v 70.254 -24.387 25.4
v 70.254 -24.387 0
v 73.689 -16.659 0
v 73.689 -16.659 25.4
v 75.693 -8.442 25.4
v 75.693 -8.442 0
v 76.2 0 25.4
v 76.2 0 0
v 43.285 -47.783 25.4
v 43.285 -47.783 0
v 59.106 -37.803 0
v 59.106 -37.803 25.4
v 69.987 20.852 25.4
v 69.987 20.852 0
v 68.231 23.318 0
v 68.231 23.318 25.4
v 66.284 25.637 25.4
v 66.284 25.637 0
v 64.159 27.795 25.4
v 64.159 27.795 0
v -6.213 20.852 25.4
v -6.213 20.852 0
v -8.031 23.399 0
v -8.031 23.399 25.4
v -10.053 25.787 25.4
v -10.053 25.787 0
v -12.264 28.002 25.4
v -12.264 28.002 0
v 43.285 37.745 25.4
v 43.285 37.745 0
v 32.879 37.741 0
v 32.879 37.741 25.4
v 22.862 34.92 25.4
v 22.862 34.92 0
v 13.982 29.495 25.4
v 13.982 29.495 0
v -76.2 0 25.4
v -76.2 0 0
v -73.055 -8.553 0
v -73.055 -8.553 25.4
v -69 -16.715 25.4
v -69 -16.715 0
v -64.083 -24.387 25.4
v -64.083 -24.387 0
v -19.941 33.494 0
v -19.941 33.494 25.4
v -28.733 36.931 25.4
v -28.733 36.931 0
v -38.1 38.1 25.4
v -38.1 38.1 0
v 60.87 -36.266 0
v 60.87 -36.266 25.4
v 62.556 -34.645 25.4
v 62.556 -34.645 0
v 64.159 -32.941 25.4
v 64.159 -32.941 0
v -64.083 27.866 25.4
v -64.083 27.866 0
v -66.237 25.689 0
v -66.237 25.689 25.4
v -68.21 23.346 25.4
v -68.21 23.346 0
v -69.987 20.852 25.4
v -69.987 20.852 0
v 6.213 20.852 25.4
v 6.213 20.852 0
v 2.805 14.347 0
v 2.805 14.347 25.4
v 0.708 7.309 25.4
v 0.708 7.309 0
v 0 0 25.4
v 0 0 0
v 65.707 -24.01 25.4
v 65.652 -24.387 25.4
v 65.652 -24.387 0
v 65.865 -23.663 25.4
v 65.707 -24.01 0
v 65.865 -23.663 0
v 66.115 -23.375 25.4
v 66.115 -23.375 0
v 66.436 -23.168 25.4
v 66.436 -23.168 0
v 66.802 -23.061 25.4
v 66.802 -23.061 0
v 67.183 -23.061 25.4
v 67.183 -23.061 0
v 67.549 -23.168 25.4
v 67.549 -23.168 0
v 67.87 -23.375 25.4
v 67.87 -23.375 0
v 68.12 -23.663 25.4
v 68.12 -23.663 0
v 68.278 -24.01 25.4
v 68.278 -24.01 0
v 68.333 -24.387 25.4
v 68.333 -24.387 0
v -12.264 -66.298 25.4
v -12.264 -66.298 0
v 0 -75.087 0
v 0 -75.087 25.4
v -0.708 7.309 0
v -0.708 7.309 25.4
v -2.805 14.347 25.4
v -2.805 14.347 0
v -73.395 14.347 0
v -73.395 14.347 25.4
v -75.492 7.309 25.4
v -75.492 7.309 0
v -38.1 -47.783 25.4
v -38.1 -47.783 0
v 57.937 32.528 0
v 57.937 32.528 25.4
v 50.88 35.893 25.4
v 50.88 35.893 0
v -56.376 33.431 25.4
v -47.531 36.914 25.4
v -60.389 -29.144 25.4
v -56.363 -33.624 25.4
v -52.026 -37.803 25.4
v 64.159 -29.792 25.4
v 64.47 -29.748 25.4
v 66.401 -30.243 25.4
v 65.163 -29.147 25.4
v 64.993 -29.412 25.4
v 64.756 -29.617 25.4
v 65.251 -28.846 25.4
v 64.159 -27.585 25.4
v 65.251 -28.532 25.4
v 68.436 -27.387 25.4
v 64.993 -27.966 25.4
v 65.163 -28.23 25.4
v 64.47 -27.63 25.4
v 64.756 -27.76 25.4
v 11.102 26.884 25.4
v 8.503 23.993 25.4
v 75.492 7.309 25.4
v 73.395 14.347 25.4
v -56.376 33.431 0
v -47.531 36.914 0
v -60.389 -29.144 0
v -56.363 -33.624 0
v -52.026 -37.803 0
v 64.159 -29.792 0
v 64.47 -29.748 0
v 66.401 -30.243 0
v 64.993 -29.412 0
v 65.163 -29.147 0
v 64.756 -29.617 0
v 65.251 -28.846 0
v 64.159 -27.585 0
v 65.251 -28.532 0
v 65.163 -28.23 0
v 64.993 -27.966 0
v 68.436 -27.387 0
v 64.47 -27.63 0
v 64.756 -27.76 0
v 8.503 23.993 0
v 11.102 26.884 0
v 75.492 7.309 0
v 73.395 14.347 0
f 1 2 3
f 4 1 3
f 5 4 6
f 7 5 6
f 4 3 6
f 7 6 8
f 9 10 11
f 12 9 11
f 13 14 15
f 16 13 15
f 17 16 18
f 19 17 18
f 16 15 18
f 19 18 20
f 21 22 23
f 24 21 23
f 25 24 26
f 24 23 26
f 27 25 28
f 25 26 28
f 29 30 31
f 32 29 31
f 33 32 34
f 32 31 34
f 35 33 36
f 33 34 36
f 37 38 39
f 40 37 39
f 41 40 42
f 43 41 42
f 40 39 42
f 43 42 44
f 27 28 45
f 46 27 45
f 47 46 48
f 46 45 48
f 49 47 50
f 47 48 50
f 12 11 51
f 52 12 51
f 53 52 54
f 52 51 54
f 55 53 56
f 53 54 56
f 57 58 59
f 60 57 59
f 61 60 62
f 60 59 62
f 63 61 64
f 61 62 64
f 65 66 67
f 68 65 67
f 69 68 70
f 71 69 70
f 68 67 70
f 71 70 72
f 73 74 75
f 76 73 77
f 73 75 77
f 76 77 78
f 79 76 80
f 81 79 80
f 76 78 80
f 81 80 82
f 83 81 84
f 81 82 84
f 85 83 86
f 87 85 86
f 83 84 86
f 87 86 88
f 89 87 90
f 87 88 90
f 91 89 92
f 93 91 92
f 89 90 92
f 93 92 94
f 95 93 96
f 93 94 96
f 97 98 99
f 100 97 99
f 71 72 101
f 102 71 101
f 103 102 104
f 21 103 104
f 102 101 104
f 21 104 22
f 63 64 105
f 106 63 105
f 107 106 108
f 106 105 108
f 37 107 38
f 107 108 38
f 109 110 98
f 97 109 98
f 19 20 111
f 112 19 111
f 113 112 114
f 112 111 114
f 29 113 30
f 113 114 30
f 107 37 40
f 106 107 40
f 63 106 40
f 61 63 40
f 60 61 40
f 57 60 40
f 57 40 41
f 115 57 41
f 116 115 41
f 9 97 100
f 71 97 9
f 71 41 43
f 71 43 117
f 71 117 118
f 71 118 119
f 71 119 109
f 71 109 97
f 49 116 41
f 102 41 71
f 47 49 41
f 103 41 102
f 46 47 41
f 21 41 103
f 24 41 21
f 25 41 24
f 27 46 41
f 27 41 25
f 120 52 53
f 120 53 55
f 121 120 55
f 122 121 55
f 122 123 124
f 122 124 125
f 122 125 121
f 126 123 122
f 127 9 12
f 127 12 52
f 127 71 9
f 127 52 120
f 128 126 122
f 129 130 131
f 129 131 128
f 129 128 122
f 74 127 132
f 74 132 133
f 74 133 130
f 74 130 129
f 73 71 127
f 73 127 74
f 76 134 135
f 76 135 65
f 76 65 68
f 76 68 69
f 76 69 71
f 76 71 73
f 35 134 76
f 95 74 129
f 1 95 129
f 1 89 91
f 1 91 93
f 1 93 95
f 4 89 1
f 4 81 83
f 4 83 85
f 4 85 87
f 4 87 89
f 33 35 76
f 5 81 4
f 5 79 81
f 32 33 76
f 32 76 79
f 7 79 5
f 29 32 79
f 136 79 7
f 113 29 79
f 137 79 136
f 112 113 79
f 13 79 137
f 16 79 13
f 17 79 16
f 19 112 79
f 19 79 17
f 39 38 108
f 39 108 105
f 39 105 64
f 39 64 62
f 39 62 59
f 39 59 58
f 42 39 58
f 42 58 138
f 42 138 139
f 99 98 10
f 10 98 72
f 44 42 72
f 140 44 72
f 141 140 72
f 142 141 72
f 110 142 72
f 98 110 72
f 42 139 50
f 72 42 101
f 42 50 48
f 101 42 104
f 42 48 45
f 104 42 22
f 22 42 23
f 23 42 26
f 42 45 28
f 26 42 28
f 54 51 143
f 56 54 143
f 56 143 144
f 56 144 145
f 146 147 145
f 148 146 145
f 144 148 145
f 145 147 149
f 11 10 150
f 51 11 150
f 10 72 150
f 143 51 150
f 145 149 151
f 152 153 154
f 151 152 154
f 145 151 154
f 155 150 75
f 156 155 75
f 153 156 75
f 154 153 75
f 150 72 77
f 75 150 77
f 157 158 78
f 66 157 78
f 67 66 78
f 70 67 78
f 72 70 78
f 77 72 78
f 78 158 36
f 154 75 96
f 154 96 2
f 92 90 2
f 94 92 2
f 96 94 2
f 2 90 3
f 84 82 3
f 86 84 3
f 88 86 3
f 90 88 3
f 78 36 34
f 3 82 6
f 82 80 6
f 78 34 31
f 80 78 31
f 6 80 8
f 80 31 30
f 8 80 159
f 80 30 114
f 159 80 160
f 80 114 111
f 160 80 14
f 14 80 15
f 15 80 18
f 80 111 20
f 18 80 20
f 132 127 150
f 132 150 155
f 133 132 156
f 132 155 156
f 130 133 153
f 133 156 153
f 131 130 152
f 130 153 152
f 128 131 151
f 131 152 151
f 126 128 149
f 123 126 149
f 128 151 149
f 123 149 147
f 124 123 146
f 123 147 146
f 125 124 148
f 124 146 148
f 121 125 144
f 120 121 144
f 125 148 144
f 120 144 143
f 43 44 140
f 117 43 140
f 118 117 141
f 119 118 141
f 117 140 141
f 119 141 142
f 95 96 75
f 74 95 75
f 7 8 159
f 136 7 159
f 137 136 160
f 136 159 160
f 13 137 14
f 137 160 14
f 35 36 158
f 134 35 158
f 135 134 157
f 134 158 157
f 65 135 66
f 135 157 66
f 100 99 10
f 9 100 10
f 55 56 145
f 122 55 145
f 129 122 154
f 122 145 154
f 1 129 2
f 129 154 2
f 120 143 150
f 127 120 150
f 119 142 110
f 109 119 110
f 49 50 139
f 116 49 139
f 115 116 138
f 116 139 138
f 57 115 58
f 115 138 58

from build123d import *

# Parameters (mm, degrees)
F1_DEPTH = 25.4


with BuildPart() as f1:
    # F0 (on Top) → F1 (new body)
    with BuildSketch(Plane.XY):
        with BuildLine():
            Line((7.3731103912, 0), (0, 0))
            Line((0, 0), (-3.0946007464, 0))
            ThreePointArc((-3.0946007464, 0), (2.1392548224, -6.2743292812), (7.3731103912, 0))
        make_face()
        with BuildLine():
            ThreePointArc((69.9874537027, 20.8518655366), (67.2803767578, 24.4972572398), (64.1588523404, 27.7947155895))
            Line((64.1588523404, 27.7947155895), (64.1588523404, 25.8992332965))
            Line((64.1588523404, 25.8992332965), (64.1588523404, 20.8518655366))
            Line((64.1588523404, 20.8518655366), (65.8508837223, 20.8518655366))
            Line((65.8508837223, 20.8518655366), (68.7087923288, 20.8518655366))
            Line((68.7087923288, 20.8518655366), (69.9874537027, 20.8518655366))
        make_face()
        with BuildLine():
            ThreePointArc((13.9820705187, 29.494668629), (9.7658289741, 25.4712534493), (6.2125462973, 20.8518655366))
            Line((6.2125462973, 20.8518655366), (7.9780612141, 20.8518655366))
            ThreePointArc((7.9780612141, 20.8518655366), (10.7168983668, 23.5907026893), (13.4557355195, 20.8518655366))
            Line((13.4557355195, 20.8518655366), (13.9820705187, 20.8518655366))
            Line((13.9820705187, 20.8518655366), (13.9820705187, 23.8748770207))
            ThreePointArc((13.9820705187, 23.8748770207), (11.8386334758, 26.0183140635), (13.9820705187, 28.1617511064))
            Line((13.9820705187, 28.1617511064), (13.9820705187, 29.494668629))
        make_face()
        with BuildLine():
            Line((-8.6229192093, 20.8518655366), (-6.2125462973, 20.8518655366))
            ThreePointArc((-6.2125462973, 20.8518655366), (-9.0177469774, 24.613666105), (-12.2641128277, 28.0020880296))
            Line((-12.2641128277, 28.0020880296), (-12.2641128277, 25.3109112382))
            Line((-12.2641128277, 25.3109112382), (-12.2641128277, 22.7124486119))
            Line((-12.2641128277, 22.7124486119), (-12.2641128277, 20.8518655366))
            Line((-12.2641128277, 20.8518655366), (-10.6853200123, 20.8518655366))
            Line((-10.6853200123, 20.8518655366), (-8.6229192093, 20.8518655366))
        make_face()
        with BuildLine():
            Line((-64.0826212534, 25.3109112382), (-64.0826212534, 27.8659898945))
            ThreePointArc((-64.0826212534, 27.8659898945), (-67.2467987777, 24.5371987198), (-69.9874537027, 20.8518655366))
            Line((-69.9874537027, 20.8518655366), (-68.3164224029, 20.8518655366))
            ThreePointArc((-68.3164224029, 20.8518655366), (-66.9433735311, 22.1881347575), (-65.5703246593, 20.8518655366))
            Line((-65.5703246593, 20.8518655366), (-64.0826212534, 20.8518655366))
            Line((-64.0826212534, 20.8518655366), (-64.0826212534, 22.7124486119))
            ThreePointArc((-64.0826212534, 22.7124486119), (-65.3282893316, 24.011679925), (-64.0826212534, 25.3109112382))
        make_face()
        with BuildLine():
            Line((-72.4636018276, 0), (-76.2, 0))
            ThreePointArc((-76.2, 0), (-71.1383173271, -12.6890619161), (-64.0826212534, -24.3873556682))
            Line((-64.0826212534, -24.3873556682), (-64.0826212534, -17.1742849052))
            ThreePointArc((-64.0826212534, -17.1742849052), (-67.6059327944, -12.0701026171), (-64.0826212534, -6.9659203291))
            Line((-64.0826212534, -6.9659203291), (-64.0826212534, 0))
            Line((-64.0826212534, 0), (-66.7451322079, 0))
            ThreePointArc((-66.7451322079, 0), (-69.6043670177, -2.4147276963), (-72.4636018276, 0))
        make_face()
        with BuildLine():
            Line((-56.3778951764, -24.3873556682), (-64.0826212534, -24.3873556682))
            ThreePointArc((-64.0826212534, -24.3873556682), (-58.4160274717, -31.4204459437), (-52.0255934776, -37.8030000781))
            Line((-52.0255934776, -37.8030000781), (-38.1, -47.7827715515))
            Line((-38.1, -47.7827715515), (-38.1, -40.8103056252))
            ThreePointArc((-38.1, -40.8103056252), (-43.5800189721, -35.9057448804), (-38.1, -31.0011841357))
            Line((-38.1, -31.0011841357), (-38.1, -24.3873556682))
            Line((-38.1, -24.3873556682), (-45.1089218259, -24.3873556682))
            Line((-45.1089218259, -24.3873556682), (-56.3778951764, -24.3873556682))
        make_face()
        with BuildLine():
            ThreePointArc((64.1588523404, -32.9412611677), (67.4447841374, -28.8340923774), (70.2541819173, -24.3873556682))
            Line((70.2541819173, -24.3873556682), (68.3325305581, -24.3873556682))
            Line((68.3325305581, -24.3873556682), (65.6523033977, -24.3873556682))
            Line((65.6523033977, -24.3873556682), (64.1588523404, -24.3873556682))
            Line((64.1588523404, -24.3873556682), (64.1588523404, -27.585182339))
            ThreePointArc((64.1588523404, -27.585182339), (65.2624770419, -28.6888070405), (64.1588523404, -29.792431742))
            Line((64.1588523404, -29.792431742), (64.1588523404, -32.9412611677))
        make_face()
        with BuildLine():
            Line((-12.2641128277, -52.9070980847), (-12.2641128277, -47.7827715515))
            Line((-12.2641128277, -47.7827715515), (-18.7669228762, -47.7827715515))
            Line((-18.7669228762, -47.7827715515), (-29.9223959446, -47.7827715515))
            Line((-29.9223959446, -47.7827715515), (-38.1, -47.7827715515))
            Line((-38.1, -47.7827715515), (-12.2641128277, -66.2980506459))
            Line((-12.2641128277, -66.2980506459), (-12.2641128277, -61.5275651217))
            ThreePointArc((-12.2641128277, -61.5275651217), (-16.9211194514, -57.2173316032), (-12.2641128277, -52.9070980847))
        make_face()
        Polygon((21.1353525519, -47.7827715515), (13.9820705187, -47.7827715515), (13.9820705187, -54.9595914781), (13.9820705187, -60.7065707445), (13.9820705187, -66.2672672047), (43.2854445061, -47.7827715515), (35.3846773505, -47.7827715515), align=None)
        with BuildLine():
            ThreePointArc((76.2, 0), (74.6138465933, 10.878832978), (69.9874537027, 20.8518655366))
            Line((69.9874537027, 20.8518655366), (68.7087923288, 20.8518655366))
            ThreePointArc((68.7087923288, 20.8518655366), (67.2798380256, 19.4229112333), (65.8508837223, 20.8518655366))
            Line((65.8508837223, 20.8518655366), (64.1588523404, 20.8518655366))
            Line((64.1588523404, 20.8518655366), (64.1588523404, 15.7774444669))
            Line((64.1588523404, 15.7774444669), (64.1588523404, 4.3457765132))
            Line((64.1588523404, 4.3457765132), (64.1588523404, 0))
            Line((64.1588523404, 0), (76.2, 0))
        make_face()
        with BuildLine():
            ThreePointArc((70.2541819173, -24.3873556682), (74.8750675455, -12.5954667415), (76.2, 0))
            Line((76.2, 0), (64.1588523404, 0))
            Line((64.1588523404, 0), (64.1588523404, -7.877567783))
            ThreePointArc((64.1588523404, -7.877567783), (69.0336172821, -12.7523327246), (64.1588523404, -17.6270976663))
            Line((64.1588523404, -17.6270976663), (64.1588523404, -24.3873556682))
            Line((64.1588523404, -24.3873556682), (65.6523033977, -24.3873556682))
            ThreePointArc((65.6523033977, -24.3873556682), (66.9924169779, -23.0472420879), (68.3325305581, -24.3873556682))
            Line((68.3325305581, -24.3873556682), (70.2541819173, -24.3873556682))
        make_face()
        with BuildLine():
            ThreePointArc((64.1588523404, 27.7947155895), (54.4953024728, 34.3919184813), (43.2854445061, 37.7454787395))
            Line((43.2854445061, 37.7454787395), (43.2854445061, 33.5203446448))
            Line((43.2854445061, 33.5203446448), (43.2854445061, 24.9465927482))
            Line((43.2854445061, 24.9465927482), (43.2854445061, 20.8518655366))
            Line((43.2854445061, 20.8518655366), (48.5843010247, 20.8518655366))
            Line((48.5843010247, 20.8518655366), (60.2541230619, 20.8518655366))
            Line((60.2541230619, 20.8518655366), (63.1740450807, 20.8518655366))
            ThreePointArc((63.1740450807, 20.8518655366), (61.5875799588, 23.7811638152), (64.1588523404, 25.8992332965))
            Line((64.1588523404, 25.8992332965), (64.1588523404, 27.7947155895))
        make_face()
        with BuildLine():
            ThreePointArc((43.2854445061, 37.7454787395), (27.7738819635, 36.6739865067), (13.9820705187, 29.494668629))
            Line((13.9820705187, 29.494668629), (13.9820705187, 28.1617511064))
            Line((13.9820705187, 28.1617511064), (13.9820705187, 23.8748770207))
            Line((13.9820705187, 23.8748770207), (13.9820705187, 20.8518655366))
            Line((13.9820705187, 20.8518655366), (22.616366089, 20.8518655366))
            ThreePointArc((22.616366089, 20.8518655366), (28.9394616748, 27.1749611223), (35.2625572606, 20.8518655366))
            Line((35.2625572606, 20.8518655366), (43.2854445061, 20.8518655366))
            Line((43.2854445061, 20.8518655366), (43.2854445061, 24.9465927482))
            ThreePointArc((43.2854445061, 24.9465927482), (38.9985685578, 29.2334686965), (43.2854445061, 33.5203446448))
            Line((43.2854445061, 33.5203446448), (43.2854445061, 37.7454787395))
        make_face()
        with BuildLine():
            ThreePointArc((6.2125462973, 20.8518655366), (1.5861534067, 10.878832978), (0, 0))
            Line((0, 0), (7.3731103912, 0))
            Line((7.3731103912, 0), (13.9820705187, 0))
            Line((13.9820705187, 0), (13.9820705187, 4.531538114))
            Line((13.9820705187, 4.531538114), (13.9820705187, 13.5946199298))
            Line((13.9820705187, 13.5946199298), (13.9820705187, 20.8518655366))
            Line((13.9820705187, 20.8518655366), (13.4557355195, 20.8518655366))
            Line((13.4557355195, 20.8518655366), (7.9780612141, 20.8518655366))
            Line((7.9780612141, 20.8518655366), (6.2125462973, 20.8518655366))
        make_face()
        with BuildLine():
            Line((-3.0946007464, 0), (0, 0))
            ThreePointArc((0, 0), (-1.5861534067, 10.878832978), (-6.2125462973, 20.8518655366))
            Line((-6.2125462973, 20.8518655366), (-8.6229192093, 20.8518655366))
            ThreePointArc((-8.6229192093, 20.8518655366), (-9.6541196108, 18.7953565289), (-10.6853200123, 20.8518655366))
            Line((-10.6853200123, 20.8518655366), (-12.2641128277, 20.8518655366))
            Line((-12.2641128277, 20.8518655366), (-12.2641128277, 13.5718295351))
            ThreePointArc((-12.2641128277, 13.5718295351), (-6.9563915031, 10.103298584), (-12.2641128277, 6.6347676329))
            Line((-12.2641128277, 6.6347676329), (-12.2641128277, 0))
            Line((-12.2641128277, 0), (-3.0946007464, 0))
        make_face()
        with BuildLine():
            Line((-12.2641128277, 25.3109112382), (-12.2641128277, 28.0020880296))
            ThreePointArc((-12.2641128277, 28.0020880296), (-24.2304209496, 35.4858391047), (-38.1, 38.1))
            Line((-38.1, 38.1), (-38.1, 33.7021276355))
            Line((-38.1, 33.7021276355), (-38.1, 25.3109112382))
            Line((-38.1, 25.3109112382), (-38.1, 20.8518655366))
            Line((-38.1, 20.8518655366), (-32.246787101, 20.8518655366))
            Line((-32.246787101, 20.8518655366), (-17.6224876195, 20.8518655366))
            Line((-17.6224876195, 20.8518655366), (-12.2641128277, 20.8518655366))
            Line((-12.2641128277, 20.8518655366), (-12.2641128277, 22.7124486119))
            ThreePointArc((-12.2641128277, 22.7124486119), (-15.2984271998, 24.011679925), (-12.2641128277, 25.3109112382))
        make_face()
        with BuildLine():
            Line((-38.1, 33.7021276355), (-38.1, 38.1))
            ThreePointArc((-38.1, 38.1), (-52.0627322724, 35.4492892382), (-64.0826212534, 27.8659898945))
            Line((-64.0826212534, 27.8659898945), (-64.0826212534, 25.3109112382))
            Line((-64.0826212534, 25.3109112382), (-64.0826212534, 22.7124486119))
            Line((-64.0826212534, 22.7124486119), (-64.0826212534, 20.8518655366))
            Line((-64.0826212534, 20.8518655366), (-55.4025620222, 20.8518655366))
            ThreePointArc((-55.4025620222, 20.8518655366), (-49.9948691577, 25.7247809767), (-44.5871762931, 20.8518655366))
            Line((-44.5871762931, 20.8518655366), (-38.1, 20.8518655366))
            Line((-38.1, 20.8518655366), (-38.1, 25.3109112382))
            ThreePointArc((-38.1, 25.3109112382), (-43.0000966156, 29.5065194368), (-38.1, 33.7021276355))
        make_face()
        with BuildLine():
            Line((-68.3164224029, 20.8518655366), (-69.9874537027, 20.8518655366))
            ThreePointArc((-69.9874537027, 20.8518655366), (-74.6138465933, 10.878832978), (-76.2, 0))
            Line((-76.2, 0), (-72.4636018276, 0))
            Line((-72.4636018276, 0), (-66.7451322079, 0))
            Line((-66.7451322079, 0), (-64.0826212534, 0))
            Line((-64.0826212534, 0), (-64.0826212534, 5.2506080829))
            ThreePointArc((-64.0826212534, 5.2506080829), (-68.2045203392, 9.7503920551), (-64.0826212534, 14.2501760274))
            Line((-64.0826212534, 14.2501760274), (-64.0826212534, 20.8518655366))
            Line((-64.0826212534, 20.8518655366), (-65.5703246593, 20.8518655366))
            Line((-65.5703246593, 20.8518655366), (-68.3164224029, 20.8518655366))
        make_face()
        with BuildLine():
            Line((48.8840192556, -24.3873556682), (43.2854445061, -24.3873556682))
            Line((43.2854445061, -24.3873556682), (43.2854445061, -29.2515400797))
            Line((43.2854445061, -29.2515400797), (43.2854445061, -44.1332776099))
            Line((43.2854445061, -44.1332776099), (43.2854445061, -47.7827715515))
            Line((43.2854445061, -47.7827715515), (59.106323868, -37.8030000781))
            ThreePointArc((59.106323868, -37.8030000781), (61.7228361509, -35.46592028), (64.1588523404, -32.9412611677))
            Line((64.1588523404, -32.9412611677), (64.1588523404, -29.792431742))
            Line((64.1588523404, -29.792431742), (64.1588523404, -27.585182339))
            Line((64.1588523404, -27.585182339), (64.1588523404, -24.3873556682))
            Line((64.1588523404, -24.3873556682), (63.8832971454, -24.3873556682))
            ThreePointArc((63.8832971454, -24.3873556682), (56.3836582005, -31.886994613), (48.8840192556, -24.3873556682))
        make_face()
        with BuildLine():
            Line((13.9820705187, -54.9595914781), (13.9820705187, -47.7827715515))
            Line((13.9820705187, -47.7827715515), (5.5258679204, -47.7827715515))
            ThreePointArc((5.5258679204, -47.7827715515), (-0.3237351775, -55.877302251), (-6.1733382754, -47.7827715515))
            Line((-6.1733382754, -47.7827715515), (-12.2641128277, -47.7827715515))
            Line((-12.2641128277, -47.7827715515), (-12.2641128277, -52.9070980847))
            Line((-12.2641128277, -52.9070980847), (-12.2641128277, -61.5275651217))
            Line((-12.2641128277, -61.5275651217), (-12.2641128277, -66.2980506459))
            Line((-12.2641128277, -66.2980506459), (0, -75.0871226192))
            Line((0, -75.0871226192), (13.9820705187, -66.2672672047))
            Line((13.9820705187, -66.2672672047), (13.9820705187, -60.7065707445))
            ThreePointArc((13.9820705187, -60.7065707445), (8.35846738, -57.8330811113), (13.9820705187, -54.9595914781))
        make_face()
        with BuildLine():
            Line((-38.1, -6.2933946028), (-38.1, 0))
            Line((-38.1, 0), (-46.1211204529, 0))
            Line((-46.1211204529, 0), (-55.3081780672, 0))
            Line((-55.3081780672, 0), (-64.0826212534, 0))
            Line((-64.0826212534, 0), (-64.0826212534, -6.9659203291))
            Line((-64.0826212534, -6.9659203291), (-64.0826212534, -17.1742849052))
            Line((-64.0826212534, -17.1742849052), (-64.0826212534, -24.3873556682))
            Line((-64.0826212534, -24.3873556682), (-56.3778951764, -24.3873556682))
            ThreePointArc((-56.3778951764, -24.3873556682), (-50.7434085011, -16.8907498785), (-45.1089218259, -24.3873556682))
            Line((-45.1089218259, -24.3873556682), (-38.1, -24.3873556682))
            Line((-38.1, -24.3873556682), (-38.1, -20.0098585337))
            Line((-38.1, -20.0098585337), (-38.1, -6.2933946028))
        make_face()
        with BuildLine():
            Line((-12.2641128277, -32.1551971138), (-12.2641128277, -24.3873556682))
            Line((-12.2641128277, -24.3873556682), (-20.3056093305, -24.3873556682))
            ThreePointArc((-20.3056093305, -24.3873556682), (-24.0561561659, -29.287069319), (-27.8067030013, -24.3873556682))
            Line((-27.8067030013, -24.3873556682), (-38.1, -24.3873556682))
            Line((-38.1, -24.3873556682), (-38.1, -31.0011841357))
            Line((-38.1, -31.0011841357), (-38.1, -40.8103056252))
            Line((-38.1, -40.8103056252), (-38.1, -47.7827715515))
            Line((-38.1, -47.7827715515), (-29.9223959446, -47.7827715515))
            ThreePointArc((-29.9223959446, -47.7827715515), (-24.3446594104, -38.7493341849), (-18.7669228762, -47.7827715515))
            Line((-18.7669228762, -47.7827715515), (-12.2641128277, -47.7827715515))
            Line((-12.2641128277, -47.7827715515), (-12.2641128277, -41.0026423633))
            Line((-12.2641128277, -41.0026423633), (-12.2641128277, -32.1551971138))
        make_face()
        with BuildLine():
            Line((21.5103328228, -24.3873556682), (13.9820705187, -24.3873556682))
            Line((13.9820705187, -24.3873556682), (13.9820705187, -31.7664258182))
            Line((13.9820705187, -31.7664258182), (13.9820705187, -41.6183918715))
            Line((13.9820705187, -41.6183918715), (13.9820705187, -47.7827715515))
            Line((13.9820705187, -47.7827715515), (21.1353525519, -47.7827715515))
            ThreePointArc((21.1353525519, -47.7827715515), (28.2600149512, -40.6581091522), (35.3846773505, -47.7827715515))
            Line((35.3846773505, -47.7827715515), (43.2854445061, -47.7827715515))
            Line((43.2854445061, -47.7827715515), (43.2854445061, -44.1332776099))
            ThreePointArc((43.2854445061, -44.1332776099), (35.844575741, -36.6924088448), (43.2854445061, -29.2515400797))
            Line((43.2854445061, -29.2515400797), (43.2854445061, -24.3873556682))
            Line((43.2854445061, -24.3873556682), (35.7596613467, -24.3873556682))
            Line((35.7596613467, -24.3873556682), (21.5103328228, -24.3873556682))
        make_face()
        with BuildLine():
            Line((13.9820705187, 0), (7.3731103912, 0))
            ThreePointArc((7.3731103912, 0), (2.1392548224, -6.2743292812), (-3.0946007464, 0))
            Line((-3.0946007464, 0), (-12.2641128277, 0))
            Line((-12.2641128277, 0), (-12.2641128277, -8.9736226946))
            ThreePointArc((-12.2641128277, -8.9736226946), (-8.4361824744, -13.0727961659), (-12.2641128277, -17.1719696373))
            Line((-12.2641128277, -17.1719696373), (-12.2641128277, -24.3873556682))
            Line((-12.2641128277, -24.3873556682), (-7.1995845065, -24.3873556682))
            Line((-7.1995845065, -24.3873556682), (6.9626118056, -24.3873556682))
            Line((6.9626118056, -24.3873556682), (13.9820705187, -24.3873556682))
            Line((13.9820705187, -24.3873556682), (13.9820705187, -18.3862992879))
            Line((13.9820705187, -18.3862992879), (13.9820705187, -9.394259192))
            Line((13.9820705187, -9.394259192), (13.9820705187, 0))
        make_face()
        with BuildLine():
            Line((-12.2641128277, -8.9736226946), (-12.2641128277, 0))
            Line((-12.2641128277, 0), (-19.0984625369, 0))
            ThreePointArc((-19.0984625369, 0), (-24.9319020659, -6.3078507166), (-30.7653415948, 0))
            Line((-30.7653415948, 0), (-38.1, 0))
            Line((-38.1, 0), (-38.1, -6.2933946028))
            ThreePointArc((-38.1, -6.2933946028), (-32.493432726, -13.1516265683), (-38.1, -20.0098585337))
            Line((-38.1, -20.0098585337), (-38.1, -24.3873556682))
            Line((-38.1, -24.3873556682), (-27.8067030013, -24.3873556682))
            Line((-27.8067030013, -24.3873556682), (-20.3056093305, -24.3873556682))
            Line((-20.3056093305, -24.3873556682), (-12.2641128277, -24.3873556682))
            Line((-12.2641128277, -24.3873556682), (-12.2641128277, -17.1719696373))
            Line((-12.2641128277, -17.1719696373), (-12.2641128277, -8.9736226946))
        make_face()
        with BuildLine():
            Line((20.543390885, 0), (13.9820705187, 0))
            Line((13.9820705187, 0), (13.9820705187, -9.394259192))
            ThreePointArc((13.9820705187, -9.394259192), (20.7282060591, -13.89027924), (13.9820705187, -18.3862992879))
            Line((13.9820705187, -18.3862992879), (13.9820705187, -24.3873556682))
            Line((13.9820705187, -24.3873556682), (21.5103328228, -24.3873556682))
            ThreePointArc((21.5103328228, -24.3873556682), (28.6349970847, -17.2626914062), (35.7596613467, -24.3873556682))
            Line((35.7596613467, -24.3873556682), (43.2854445061, -24.3873556682))
            Line((43.2854445061, -24.3873556682), (43.2854445061, -21.2359833103))
            ThreePointArc((43.2854445061, -21.2359833103), (35.176776054, -13.1273148581), (43.2854445061, -5.018646406))
            Line((43.2854445061, -5.018646406), (43.2854445061, 0))
            Line((43.2854445061, 0), (31.3057955354, 0))
            Line((31.3057955354, 0), (20.543390885, 0))
        make_face()
        Polygon((47.1553392708, 0), (43.2854445061, 0), (43.2854445061, -5.018646406), (43.2854445061, -21.2359833103), (43.2854445061, -24.3873556682), (48.8840192556, -24.3873556682), (63.8832971454, -24.3873556682), (64.1588523404, -24.3873556682), (64.1588523404, -17.6270976663), (64.1588523404, -7.877567783), (64.1588523404, 0), (60.4922883213, 0), align=None)
        with BuildLine():
            Line((13.9820705187, 4.531538114), (13.9820705187, 0))
            Line((13.9820705187, 0), (20.543390885, 0))
            ThreePointArc((20.543390885, 0), (25.9245932102, 5.3812023252), (31.3057955354, 0))
            Line((31.3057955354, 0), (43.2854445061, 0))
            Line((43.2854445061, 0), (43.2854445061, 9.0630790219))
            ThreePointArc((43.2854445061, 9.0630790219), (38.119115994, 14.229407534), (43.2854445061, 19.3957360461))
            Line((43.2854445061, 19.3957360461), (43.2854445061, 20.8518655366))
            Line((43.2854445061, 20.8518655366), (35.2625572606, 20.8518655366))
            Line((35.2625572606, 20.8518655366), (22.616366089, 20.8518655366))
            Line((22.616366089, 20.8518655366), (13.9820705187, 20.8518655366))
            Line((13.9820705187, 20.8518655366), (13.9820705187, 13.5946199298))
            ThreePointArc((13.9820705187, 13.5946199298), (18.5136114266, 9.0630790219), (13.9820705187, 4.531538114))
        make_face()
        with BuildLine():
            Line((43.2854445061, 9.0630790219), (43.2854445061, 0))
            Line((43.2854445061, 0), (47.1553392708, 0))
            ThreePointArc((47.1553392708, 0), (53.823813796, 6.6684745252), (60.4922883213, 0))
            Line((60.4922883213, 0), (64.1588523404, 0))
            Line((64.1588523404, 0), (64.1588523404, 4.3457765132))
            ThreePointArc((64.1588523404, 4.3457765132), (58.4430183636, 10.0616104901), (64.1588523404, 15.7774444669))
            Line((64.1588523404, 15.7774444669), (64.1588523404, 20.8518655366))
            Line((64.1588523404, 20.8518655366), (63.1740450807, 20.8518655366))
            Line((63.1740450807, 20.8518655366), (60.2541230619, 20.8518655366))
            ThreePointArc((60.2541230619, 20.8518655366), (54.4192120433, 15.016954518), (48.5843010247, 20.8518655366))
            Line((48.5843010247, 20.8518655366), (43.2854445061, 20.8518655366))
            Line((43.2854445061, 20.8518655366), (43.2854445061, 19.3957360461))
            Line((43.2854445061, 19.3957360461), (43.2854445061, 9.0630790219))
        make_face()
        with BuildLine():
            Line((-19.0984625369, 0), (-12.2641128277, 0))
            Line((-12.2641128277, 0), (-12.2641128277, 6.6347676329))
            Line((-12.2641128277, 6.6347676329), (-12.2641128277, 13.5718295351))
            Line((-12.2641128277, 13.5718295351), (-12.2641128277, 20.8518655366))
            Line((-12.2641128277, 20.8518655366), (-17.6224876195, 20.8518655366))
            ThreePointArc((-17.6224876195, 20.8518655366), (-24.9346373603, 15.1396827417), (-32.246787101, 20.8518655366))
            Line((-32.246787101, 20.8518655366), (-38.1, 20.8518655366))
            Line((-38.1, 20.8518655366), (-38.1, 14.0626849607))
            ThreePointArc((-38.1, 14.0626849607), (-33.6929838401, 9.2347918544), (-38.1, 4.4068987481))
            Line((-38.1, 4.4068987481), (-38.1, 0))
            Line((-38.1, 0), (-30.7653415948, 0))
            Line((-30.7653415948, 0), (-19.0984625369, 0))
        make_face()
        with BuildLine():
            Line((-46.1211204529, 0), (-38.1, 0))
            Line((-38.1, 0), (-38.1, 4.4068987481))
            Line((-38.1, 4.4068987481), (-38.1, 14.0626849607))
            Line((-38.1, 14.0626849607), (-38.1, 20.8518655366))
            Line((-38.1, 20.8518655366), (-44.5871762931, 20.8518655366))
            Line((-44.5871762931, 20.8518655366), (-55.4025620222, 20.8518655366))
            Line((-55.4025620222, 20.8518655366), (-64.0826212534, 20.8518655366))
            Line((-64.0826212534, 20.8518655366), (-64.0826212534, 14.2501760274))
            Line((-64.0826212534, 14.2501760274), (-64.0826212534, 5.2506080829))
            Line((-64.0826212534, 5.2506080829), (-64.0826212534, 0))
            Line((-64.0826212534, 0), (-55.3081780672, 0))
            ThreePointArc((-55.3081780672, 0), (-50.71464926, 4.1266133924), (-46.1211204529, 0))
        make_face()
        with BuildLine():
            Line((13.9820705187, -31.7664258182), (13.9820705187, -24.3873556682))
            Line((13.9820705187, -24.3873556682), (6.9626118056, -24.3873556682))
            ThreePointArc((6.9626118056, -24.3873556682), (-0.1184863504, -31.8409854663), (-7.1995845065, -24.3873556682))
            Line((-7.1995845065, -24.3873556682), (-12.2641128277, -24.3873556682))
            Line((-12.2641128277, -24.3873556682), (-12.2641128277, -32.1551971138))
            ThreePointArc((-12.2641128277, -32.1551971138), (-6.9831720335, -36.5789197385), (-12.2641128277, -41.0026423633))
            Line((-12.2641128277, -41.0026423633), (-12.2641128277, -47.7827715515))
            Line((-12.2641128277, -47.7827715515), (-6.1733382754, -47.7827715515))
            Line((-6.1733382754, -47.7827715515), (5.5258679204, -47.7827715515))
            Line((5.5258679204, -47.7827715515), (13.9820705187, -47.7827715515))
            Line((13.9820705187, -47.7827715515), (13.9820705187, -41.6183918715))
            ThreePointArc((13.9820705187, -41.6183918715), (4.354912737, -36.6924088448), (13.9820705187, -31.7664258182))
        make_face()
        with BuildLine():
            ThreePointArc((-10.6853200123, 20.8518655366), (-9.6541196108, 18.7953565289), (-8.6229192093, 20.8518655366))
            Line((-8.6229192093, 20.8518655366), (-10.6853200123, 20.8518655366))
        make_face()
        with BuildLine():
            Line((-12.2641128277, 22.7124486119), (-12.2641128277, 25.3109112382))
            ThreePointArc((-12.2641128277, 25.3109112382), (-15.2984271998, 24.011679925), (-12.2641128277, 22.7124486119))
        make_face()
        with BuildLine():
            ThreePointArc((-32.246787101, 20.8518655366), (-24.9346373603, 15.1396827417), (-17.6224876195, 20.8518655366))
            Line((-17.6224876195, 20.8518655366), (-32.246787101, 20.8518655366))
        make_face()
        with BuildLine():
            Line((-12.2641128277, 13.5718295351), (-12.2641128277, 6.6347676329))
            ThreePointArc((-12.2641128277, 6.6347676329), (-6.9563915031, 10.103298584), (-12.2641128277, 13.5718295351))
        make_face()
        with BuildLine():
            ThreePointArc((-30.7653415948, 0), (-24.9319020659, -6.3078507166), (-19.0984625369, 0))
            Line((-19.0984625369, 0), (-30.7653415948, 0))
        make_face()
        with BuildLine():
            Line((-38.1, 14.0626849607), (-38.1, 4.4068987481))
            ThreePointArc((-38.1, 4.4068987481), (-33.6929838401, 9.2347918544), (-38.1, 14.0626849607))
        make_face()
        with BuildLine():
            Line((-38.1, 25.3109112382), (-38.1, 33.7021276355))
            ThreePointArc((-38.1, 33.7021276355), (-43.0000966156, 29.5065194368), (-38.1, 25.3109112382))
        make_face()
        with BuildLine():
            Line((-55.4025620222, 20.8518655366), (-44.5871762931, 20.8518655366))
            ThreePointArc((-44.5871762931, 20.8518655366), (-49.9948691577, 25.7247809767), (-55.4025620222, 20.8518655366))
        make_face()
        with BuildLine():
            Line((-64.0826212534, 22.7124486119), (-64.0826212534, 25.3109112382))
            ThreePointArc((-64.0826212534, 25.3109112382), (-65.3282893316, 24.011679925), (-64.0826212534, 22.7124486119))
        make_face()
        with BuildLine():
            ThreePointArc((-65.5703246593, 20.8518655366), (-66.9433735311, 22.1881347575), (-68.3164224029, 20.8518655366))
            Line((-68.3164224029, 20.8518655366), (-65.5703246593, 20.8518655366))
        make_face()
        with BuildLine():
            Line((-64.0826212534, 5.2506080829), (-64.0826212534, 14.2501760274))
            ThreePointArc((-64.0826212534, 14.2501760274), (-68.2045203392, 9.7503920551), (-64.0826212534, 5.2506080829))
        make_face()
        with BuildLine():
            Line((-66.7451322079, 0), (-72.4636018276, 0))
            ThreePointArc((-72.4636018276, 0), (-69.6043670177, -2.4147276963), (-66.7451322079, 0))
        make_face()
        with BuildLine():
            ThreePointArc((-64.0826212534, -6.9659203291), (-67.6059327944, -12.0701026171), (-64.0826212534, -17.1742849052))
            Line((-64.0826212534, -17.1742849052), (-64.0826212534, -6.9659203291))
        make_face()
        with BuildLine():
            ThreePointArc((-45.1089218259, -24.3873556682), (-50.7434085011, -16.8907498785), (-56.3778951764, -24.3873556682))
            Line((-56.3778951764, -24.3873556682), (-45.1089218259, -24.3873556682))
        make_face()
        with BuildLine():
            ThreePointArc((-38.1, -20.0098585337), (-32.493432726, -13.1516265683), (-38.1, -6.2933946028))
            Line((-38.1, -6.2933946028), (-38.1, -20.0098585337))
        make_face()
        with BuildLine():
            Line((-55.3081780672, 0), (-46.1211204529, 0))
            ThreePointArc((-46.1211204529, 0), (-50.71464926, 4.1266133924), (-55.3081780672, 0))
        make_face()
        with BuildLine():
            ThreePointArc((-12.2641128277, -17.1719696373), (-8.4361824744, -13.0727961659), (-12.2641128277, -8.9736226946))
            Line((-12.2641128277, -8.9736226946), (-12.2641128277, -17.1719696373))
        make_face()
        with BuildLine():
            ThreePointArc((-27.8067030013, -24.3873556682), (-24.0561561659, -29.287069319), (-20.3056093305, -24.3873556682))
            Line((-20.3056093305, -24.3873556682), (-27.8067030013, -24.3873556682))
        make_face()
        with BuildLine():
            Line((-38.1, -40.8103056252), (-38.1, -31.0011841357))
            ThreePointArc((-38.1, -31.0011841357), (-43.5800189721, -35.9057448804), (-38.1, -40.8103056252))
        make_face()
        with BuildLine():
            Line((-29.9223959446, -47.7827715515), (-18.7669228762, -47.7827715515))
            ThreePointArc((-18.7669228762, -47.7827715515), (-24.3446594104, -38.7493341849), (-29.9223959446, -47.7827715515))
        make_face()
        with BuildLine():
            ThreePointArc((-12.2641128277, -41.0026423633), (-6.9831720335, -36.5789197385), (-12.2641128277, -32.1551971138))
            Line((-12.2641128277, -32.1551971138), (-12.2641128277, -41.0026423633))
        make_face()
        with BuildLine():
            ThreePointArc((-7.1995845065, -24.3873556682), (-0.1184863504, -31.8409854663), (6.9626118056, -24.3873556682))
            Line((6.9626118056, -24.3873556682), (-7.1995845065, -24.3873556682))
        make_face()
        with BuildLine():
            Line((13.9820705187, -41.6183918715), (13.9820705187, -31.7664258182))
            ThreePointArc((13.9820705187, -31.7664258182), (4.354912737, -36.6924088448), (13.9820705187, -41.6183918715))
        make_face()
        with BuildLine():
            ThreePointArc((-6.1733382754, -47.7827715515), (-0.3237351775, -55.877302251), (5.5258679204, -47.7827715515))
            Line((5.5258679204, -47.7827715515), (-6.1733382754, -47.7827715515))
        make_face()
        with BuildLine():
            Line((13.9820705187, -60.7065707445), (13.9820705187, -54.9595914781))
            ThreePointArc((13.9820705187, -54.9595914781), (8.35846738, -57.8330811113), (13.9820705187, -60.7065707445))
        make_face()
        with BuildLine():
            Line((-12.2641128277, -61.5275651217), (-12.2641128277, -52.9070980847))
            ThreePointArc((-12.2641128277, -52.9070980847), (-16.9211194514, -57.2173316032), (-12.2641128277, -61.5275651217))
        make_face()
        with BuildLine():
            ThreePointArc((35.3846773505, -47.7827715515), (28.2600149512, -40.6581091522), (21.1353525519, -47.7827715515))
            Line((21.1353525519, -47.7827715515), (35.3846773505, -47.7827715515))
        make_face()
        with BuildLine():
            Line((43.2854445061, -44.1332776099), (43.2854445061, -29.2515400797))
            ThreePointArc((43.2854445061, -29.2515400797), (35.844575741, -36.6924088448), (43.2854445061, -44.1332776099))
        make_face()
        with BuildLine():
            ThreePointArc((35.7596613467, -24.3873556682), (28.6349970847, -17.2626914062), (21.5103328228, -24.3873556682))
            Line((21.5103328228, -24.3873556682), (35.7596613467, -24.3873556682))
        make_face()
        with BuildLine():
            ThreePointArc((64.1588523404, -17.6270976663), (69.0336172821, -12.7523327246), (64.1588523404, -7.877567783))
            Line((64.1588523404, -7.877567783), (64.1588523404, -17.6270976663))
        make_face()
        with BuildLine():
            Line((43.2854445061, -21.2359833103), (43.2854445061, -5.018646406))
            ThreePointArc((43.2854445061, -5.018646406), (35.176776054, -13.1273148581), (43.2854445061, -21.2359833103))
        make_face()
        with BuildLine():
            ThreePointArc((31.3057955354, 0), (25.9245932102, 5.3812023252), (20.543390885, 0))
            Line((20.543390885, 0), (31.3057955354, 0))
        make_face()
        with BuildLine():
            Line((13.9820705187, 13.5946199298), (13.9820705187, 4.531538114))
            ThreePointArc((13.9820705187, 4.531538114), (18.5136114266, 9.0630790219), (13.9820705187, 13.5946199298))
        make_face()
        with BuildLine():
            ThreePointArc((43.2854445061, 19.3957360461), (38.119115994, 14.229407534), (43.2854445061, 9.0630790219))
            Line((43.2854445061, 9.0630790219), (43.2854445061, 19.3957360461))
        make_face()
        with BuildLine():
            ThreePointArc((48.5843010247, 20.8518655366), (54.4192120433, 15.016954518), (60.2541230619, 20.8518655366))
            Line((60.2541230619, 20.8518655366), (48.5843010247, 20.8518655366))
        make_face()
        with BuildLine():
            Line((64.1588523404, 4.3457765132), (64.1588523404, 15.7774444669))
            ThreePointArc((64.1588523404, 15.7774444669), (58.4430183636, 10.0616104901), (64.1588523404, 4.3457765132))
        make_face()
        with BuildLine():
            ThreePointArc((60.4922883213, 0), (53.823813796, 6.6684745252), (47.1553392708, 0))
            Line((47.1553392708, 0), (60.4922883213, 0))
        make_face()
        with BuildLine():
            ThreePointArc((13.9820705187, -18.3862992879), (20.7282060591, -13.89027924), (13.9820705187, -9.394259192))
            Line((13.9820705187, -9.394259192), (13.9820705187, -18.3862992879))
        make_face()
        with BuildLine():
            Line((64.1588523404, 20.8518655366), (64.1588523404, 25.8992332965))
            ThreePointArc((64.1588523404, 25.8992332965), (61.5875799588, 23.7811638152), (63.1740450807, 20.8518655366))
            Line((63.1740450807, 20.8518655366), (64.1588523404, 20.8518655366))
        make_face()
        with BuildLine():
            ThreePointArc((65.8508837223, 20.8518655366), (67.2798380256, 19.4229112333), (68.7087923288, 20.8518655366))
            Line((68.7087923288, 20.8518655366), (65.8508837223, 20.8518655366))
        make_face()
        with BuildLine():
            ThreePointArc((35.2625572606, 20.8518655366), (28.9394616748, 27.1749611223), (22.616366089, 20.8518655366))
            Line((22.616366089, 20.8518655366), (35.2625572606, 20.8518655366))
        make_face()
        with BuildLine():
            Line((13.9820705187, 23.8748770207), (13.9820705187, 28.1617511064))
            ThreePointArc((13.9820705187, 28.1617511064), (11.8386334758, 26.0183140635), (13.9820705187, 23.8748770207))
        make_face()
        with BuildLine():
            ThreePointArc((13.4557355195, 20.8518655366), (10.7168983668, 23.5907026893), (7.9780612141, 20.8518655366))
            Line((7.9780612141, 20.8518655366), (13.4557355195, 20.8518655366))
        make_face()
        with BuildLine():
            Line((43.2854445061, 24.9465927482), (43.2854445061, 33.5203446448))
            ThreePointArc((43.2854445061, 33.5203446448), (38.9985685578, 29.2334686965), (43.2854445061, 24.9465927482))
        make_face()
        with BuildLine():
            Line((63.8832971454, -24.3873556682), (48.8840192556, -24.3873556682))
            ThreePointArc((48.8840192556, -24.3873556682), (56.3836582005, -31.886994613), (63.8832971454, -24.3873556682))
        make_face()
    extrude(amount=F1_DEPTH)


solid = f1.part
